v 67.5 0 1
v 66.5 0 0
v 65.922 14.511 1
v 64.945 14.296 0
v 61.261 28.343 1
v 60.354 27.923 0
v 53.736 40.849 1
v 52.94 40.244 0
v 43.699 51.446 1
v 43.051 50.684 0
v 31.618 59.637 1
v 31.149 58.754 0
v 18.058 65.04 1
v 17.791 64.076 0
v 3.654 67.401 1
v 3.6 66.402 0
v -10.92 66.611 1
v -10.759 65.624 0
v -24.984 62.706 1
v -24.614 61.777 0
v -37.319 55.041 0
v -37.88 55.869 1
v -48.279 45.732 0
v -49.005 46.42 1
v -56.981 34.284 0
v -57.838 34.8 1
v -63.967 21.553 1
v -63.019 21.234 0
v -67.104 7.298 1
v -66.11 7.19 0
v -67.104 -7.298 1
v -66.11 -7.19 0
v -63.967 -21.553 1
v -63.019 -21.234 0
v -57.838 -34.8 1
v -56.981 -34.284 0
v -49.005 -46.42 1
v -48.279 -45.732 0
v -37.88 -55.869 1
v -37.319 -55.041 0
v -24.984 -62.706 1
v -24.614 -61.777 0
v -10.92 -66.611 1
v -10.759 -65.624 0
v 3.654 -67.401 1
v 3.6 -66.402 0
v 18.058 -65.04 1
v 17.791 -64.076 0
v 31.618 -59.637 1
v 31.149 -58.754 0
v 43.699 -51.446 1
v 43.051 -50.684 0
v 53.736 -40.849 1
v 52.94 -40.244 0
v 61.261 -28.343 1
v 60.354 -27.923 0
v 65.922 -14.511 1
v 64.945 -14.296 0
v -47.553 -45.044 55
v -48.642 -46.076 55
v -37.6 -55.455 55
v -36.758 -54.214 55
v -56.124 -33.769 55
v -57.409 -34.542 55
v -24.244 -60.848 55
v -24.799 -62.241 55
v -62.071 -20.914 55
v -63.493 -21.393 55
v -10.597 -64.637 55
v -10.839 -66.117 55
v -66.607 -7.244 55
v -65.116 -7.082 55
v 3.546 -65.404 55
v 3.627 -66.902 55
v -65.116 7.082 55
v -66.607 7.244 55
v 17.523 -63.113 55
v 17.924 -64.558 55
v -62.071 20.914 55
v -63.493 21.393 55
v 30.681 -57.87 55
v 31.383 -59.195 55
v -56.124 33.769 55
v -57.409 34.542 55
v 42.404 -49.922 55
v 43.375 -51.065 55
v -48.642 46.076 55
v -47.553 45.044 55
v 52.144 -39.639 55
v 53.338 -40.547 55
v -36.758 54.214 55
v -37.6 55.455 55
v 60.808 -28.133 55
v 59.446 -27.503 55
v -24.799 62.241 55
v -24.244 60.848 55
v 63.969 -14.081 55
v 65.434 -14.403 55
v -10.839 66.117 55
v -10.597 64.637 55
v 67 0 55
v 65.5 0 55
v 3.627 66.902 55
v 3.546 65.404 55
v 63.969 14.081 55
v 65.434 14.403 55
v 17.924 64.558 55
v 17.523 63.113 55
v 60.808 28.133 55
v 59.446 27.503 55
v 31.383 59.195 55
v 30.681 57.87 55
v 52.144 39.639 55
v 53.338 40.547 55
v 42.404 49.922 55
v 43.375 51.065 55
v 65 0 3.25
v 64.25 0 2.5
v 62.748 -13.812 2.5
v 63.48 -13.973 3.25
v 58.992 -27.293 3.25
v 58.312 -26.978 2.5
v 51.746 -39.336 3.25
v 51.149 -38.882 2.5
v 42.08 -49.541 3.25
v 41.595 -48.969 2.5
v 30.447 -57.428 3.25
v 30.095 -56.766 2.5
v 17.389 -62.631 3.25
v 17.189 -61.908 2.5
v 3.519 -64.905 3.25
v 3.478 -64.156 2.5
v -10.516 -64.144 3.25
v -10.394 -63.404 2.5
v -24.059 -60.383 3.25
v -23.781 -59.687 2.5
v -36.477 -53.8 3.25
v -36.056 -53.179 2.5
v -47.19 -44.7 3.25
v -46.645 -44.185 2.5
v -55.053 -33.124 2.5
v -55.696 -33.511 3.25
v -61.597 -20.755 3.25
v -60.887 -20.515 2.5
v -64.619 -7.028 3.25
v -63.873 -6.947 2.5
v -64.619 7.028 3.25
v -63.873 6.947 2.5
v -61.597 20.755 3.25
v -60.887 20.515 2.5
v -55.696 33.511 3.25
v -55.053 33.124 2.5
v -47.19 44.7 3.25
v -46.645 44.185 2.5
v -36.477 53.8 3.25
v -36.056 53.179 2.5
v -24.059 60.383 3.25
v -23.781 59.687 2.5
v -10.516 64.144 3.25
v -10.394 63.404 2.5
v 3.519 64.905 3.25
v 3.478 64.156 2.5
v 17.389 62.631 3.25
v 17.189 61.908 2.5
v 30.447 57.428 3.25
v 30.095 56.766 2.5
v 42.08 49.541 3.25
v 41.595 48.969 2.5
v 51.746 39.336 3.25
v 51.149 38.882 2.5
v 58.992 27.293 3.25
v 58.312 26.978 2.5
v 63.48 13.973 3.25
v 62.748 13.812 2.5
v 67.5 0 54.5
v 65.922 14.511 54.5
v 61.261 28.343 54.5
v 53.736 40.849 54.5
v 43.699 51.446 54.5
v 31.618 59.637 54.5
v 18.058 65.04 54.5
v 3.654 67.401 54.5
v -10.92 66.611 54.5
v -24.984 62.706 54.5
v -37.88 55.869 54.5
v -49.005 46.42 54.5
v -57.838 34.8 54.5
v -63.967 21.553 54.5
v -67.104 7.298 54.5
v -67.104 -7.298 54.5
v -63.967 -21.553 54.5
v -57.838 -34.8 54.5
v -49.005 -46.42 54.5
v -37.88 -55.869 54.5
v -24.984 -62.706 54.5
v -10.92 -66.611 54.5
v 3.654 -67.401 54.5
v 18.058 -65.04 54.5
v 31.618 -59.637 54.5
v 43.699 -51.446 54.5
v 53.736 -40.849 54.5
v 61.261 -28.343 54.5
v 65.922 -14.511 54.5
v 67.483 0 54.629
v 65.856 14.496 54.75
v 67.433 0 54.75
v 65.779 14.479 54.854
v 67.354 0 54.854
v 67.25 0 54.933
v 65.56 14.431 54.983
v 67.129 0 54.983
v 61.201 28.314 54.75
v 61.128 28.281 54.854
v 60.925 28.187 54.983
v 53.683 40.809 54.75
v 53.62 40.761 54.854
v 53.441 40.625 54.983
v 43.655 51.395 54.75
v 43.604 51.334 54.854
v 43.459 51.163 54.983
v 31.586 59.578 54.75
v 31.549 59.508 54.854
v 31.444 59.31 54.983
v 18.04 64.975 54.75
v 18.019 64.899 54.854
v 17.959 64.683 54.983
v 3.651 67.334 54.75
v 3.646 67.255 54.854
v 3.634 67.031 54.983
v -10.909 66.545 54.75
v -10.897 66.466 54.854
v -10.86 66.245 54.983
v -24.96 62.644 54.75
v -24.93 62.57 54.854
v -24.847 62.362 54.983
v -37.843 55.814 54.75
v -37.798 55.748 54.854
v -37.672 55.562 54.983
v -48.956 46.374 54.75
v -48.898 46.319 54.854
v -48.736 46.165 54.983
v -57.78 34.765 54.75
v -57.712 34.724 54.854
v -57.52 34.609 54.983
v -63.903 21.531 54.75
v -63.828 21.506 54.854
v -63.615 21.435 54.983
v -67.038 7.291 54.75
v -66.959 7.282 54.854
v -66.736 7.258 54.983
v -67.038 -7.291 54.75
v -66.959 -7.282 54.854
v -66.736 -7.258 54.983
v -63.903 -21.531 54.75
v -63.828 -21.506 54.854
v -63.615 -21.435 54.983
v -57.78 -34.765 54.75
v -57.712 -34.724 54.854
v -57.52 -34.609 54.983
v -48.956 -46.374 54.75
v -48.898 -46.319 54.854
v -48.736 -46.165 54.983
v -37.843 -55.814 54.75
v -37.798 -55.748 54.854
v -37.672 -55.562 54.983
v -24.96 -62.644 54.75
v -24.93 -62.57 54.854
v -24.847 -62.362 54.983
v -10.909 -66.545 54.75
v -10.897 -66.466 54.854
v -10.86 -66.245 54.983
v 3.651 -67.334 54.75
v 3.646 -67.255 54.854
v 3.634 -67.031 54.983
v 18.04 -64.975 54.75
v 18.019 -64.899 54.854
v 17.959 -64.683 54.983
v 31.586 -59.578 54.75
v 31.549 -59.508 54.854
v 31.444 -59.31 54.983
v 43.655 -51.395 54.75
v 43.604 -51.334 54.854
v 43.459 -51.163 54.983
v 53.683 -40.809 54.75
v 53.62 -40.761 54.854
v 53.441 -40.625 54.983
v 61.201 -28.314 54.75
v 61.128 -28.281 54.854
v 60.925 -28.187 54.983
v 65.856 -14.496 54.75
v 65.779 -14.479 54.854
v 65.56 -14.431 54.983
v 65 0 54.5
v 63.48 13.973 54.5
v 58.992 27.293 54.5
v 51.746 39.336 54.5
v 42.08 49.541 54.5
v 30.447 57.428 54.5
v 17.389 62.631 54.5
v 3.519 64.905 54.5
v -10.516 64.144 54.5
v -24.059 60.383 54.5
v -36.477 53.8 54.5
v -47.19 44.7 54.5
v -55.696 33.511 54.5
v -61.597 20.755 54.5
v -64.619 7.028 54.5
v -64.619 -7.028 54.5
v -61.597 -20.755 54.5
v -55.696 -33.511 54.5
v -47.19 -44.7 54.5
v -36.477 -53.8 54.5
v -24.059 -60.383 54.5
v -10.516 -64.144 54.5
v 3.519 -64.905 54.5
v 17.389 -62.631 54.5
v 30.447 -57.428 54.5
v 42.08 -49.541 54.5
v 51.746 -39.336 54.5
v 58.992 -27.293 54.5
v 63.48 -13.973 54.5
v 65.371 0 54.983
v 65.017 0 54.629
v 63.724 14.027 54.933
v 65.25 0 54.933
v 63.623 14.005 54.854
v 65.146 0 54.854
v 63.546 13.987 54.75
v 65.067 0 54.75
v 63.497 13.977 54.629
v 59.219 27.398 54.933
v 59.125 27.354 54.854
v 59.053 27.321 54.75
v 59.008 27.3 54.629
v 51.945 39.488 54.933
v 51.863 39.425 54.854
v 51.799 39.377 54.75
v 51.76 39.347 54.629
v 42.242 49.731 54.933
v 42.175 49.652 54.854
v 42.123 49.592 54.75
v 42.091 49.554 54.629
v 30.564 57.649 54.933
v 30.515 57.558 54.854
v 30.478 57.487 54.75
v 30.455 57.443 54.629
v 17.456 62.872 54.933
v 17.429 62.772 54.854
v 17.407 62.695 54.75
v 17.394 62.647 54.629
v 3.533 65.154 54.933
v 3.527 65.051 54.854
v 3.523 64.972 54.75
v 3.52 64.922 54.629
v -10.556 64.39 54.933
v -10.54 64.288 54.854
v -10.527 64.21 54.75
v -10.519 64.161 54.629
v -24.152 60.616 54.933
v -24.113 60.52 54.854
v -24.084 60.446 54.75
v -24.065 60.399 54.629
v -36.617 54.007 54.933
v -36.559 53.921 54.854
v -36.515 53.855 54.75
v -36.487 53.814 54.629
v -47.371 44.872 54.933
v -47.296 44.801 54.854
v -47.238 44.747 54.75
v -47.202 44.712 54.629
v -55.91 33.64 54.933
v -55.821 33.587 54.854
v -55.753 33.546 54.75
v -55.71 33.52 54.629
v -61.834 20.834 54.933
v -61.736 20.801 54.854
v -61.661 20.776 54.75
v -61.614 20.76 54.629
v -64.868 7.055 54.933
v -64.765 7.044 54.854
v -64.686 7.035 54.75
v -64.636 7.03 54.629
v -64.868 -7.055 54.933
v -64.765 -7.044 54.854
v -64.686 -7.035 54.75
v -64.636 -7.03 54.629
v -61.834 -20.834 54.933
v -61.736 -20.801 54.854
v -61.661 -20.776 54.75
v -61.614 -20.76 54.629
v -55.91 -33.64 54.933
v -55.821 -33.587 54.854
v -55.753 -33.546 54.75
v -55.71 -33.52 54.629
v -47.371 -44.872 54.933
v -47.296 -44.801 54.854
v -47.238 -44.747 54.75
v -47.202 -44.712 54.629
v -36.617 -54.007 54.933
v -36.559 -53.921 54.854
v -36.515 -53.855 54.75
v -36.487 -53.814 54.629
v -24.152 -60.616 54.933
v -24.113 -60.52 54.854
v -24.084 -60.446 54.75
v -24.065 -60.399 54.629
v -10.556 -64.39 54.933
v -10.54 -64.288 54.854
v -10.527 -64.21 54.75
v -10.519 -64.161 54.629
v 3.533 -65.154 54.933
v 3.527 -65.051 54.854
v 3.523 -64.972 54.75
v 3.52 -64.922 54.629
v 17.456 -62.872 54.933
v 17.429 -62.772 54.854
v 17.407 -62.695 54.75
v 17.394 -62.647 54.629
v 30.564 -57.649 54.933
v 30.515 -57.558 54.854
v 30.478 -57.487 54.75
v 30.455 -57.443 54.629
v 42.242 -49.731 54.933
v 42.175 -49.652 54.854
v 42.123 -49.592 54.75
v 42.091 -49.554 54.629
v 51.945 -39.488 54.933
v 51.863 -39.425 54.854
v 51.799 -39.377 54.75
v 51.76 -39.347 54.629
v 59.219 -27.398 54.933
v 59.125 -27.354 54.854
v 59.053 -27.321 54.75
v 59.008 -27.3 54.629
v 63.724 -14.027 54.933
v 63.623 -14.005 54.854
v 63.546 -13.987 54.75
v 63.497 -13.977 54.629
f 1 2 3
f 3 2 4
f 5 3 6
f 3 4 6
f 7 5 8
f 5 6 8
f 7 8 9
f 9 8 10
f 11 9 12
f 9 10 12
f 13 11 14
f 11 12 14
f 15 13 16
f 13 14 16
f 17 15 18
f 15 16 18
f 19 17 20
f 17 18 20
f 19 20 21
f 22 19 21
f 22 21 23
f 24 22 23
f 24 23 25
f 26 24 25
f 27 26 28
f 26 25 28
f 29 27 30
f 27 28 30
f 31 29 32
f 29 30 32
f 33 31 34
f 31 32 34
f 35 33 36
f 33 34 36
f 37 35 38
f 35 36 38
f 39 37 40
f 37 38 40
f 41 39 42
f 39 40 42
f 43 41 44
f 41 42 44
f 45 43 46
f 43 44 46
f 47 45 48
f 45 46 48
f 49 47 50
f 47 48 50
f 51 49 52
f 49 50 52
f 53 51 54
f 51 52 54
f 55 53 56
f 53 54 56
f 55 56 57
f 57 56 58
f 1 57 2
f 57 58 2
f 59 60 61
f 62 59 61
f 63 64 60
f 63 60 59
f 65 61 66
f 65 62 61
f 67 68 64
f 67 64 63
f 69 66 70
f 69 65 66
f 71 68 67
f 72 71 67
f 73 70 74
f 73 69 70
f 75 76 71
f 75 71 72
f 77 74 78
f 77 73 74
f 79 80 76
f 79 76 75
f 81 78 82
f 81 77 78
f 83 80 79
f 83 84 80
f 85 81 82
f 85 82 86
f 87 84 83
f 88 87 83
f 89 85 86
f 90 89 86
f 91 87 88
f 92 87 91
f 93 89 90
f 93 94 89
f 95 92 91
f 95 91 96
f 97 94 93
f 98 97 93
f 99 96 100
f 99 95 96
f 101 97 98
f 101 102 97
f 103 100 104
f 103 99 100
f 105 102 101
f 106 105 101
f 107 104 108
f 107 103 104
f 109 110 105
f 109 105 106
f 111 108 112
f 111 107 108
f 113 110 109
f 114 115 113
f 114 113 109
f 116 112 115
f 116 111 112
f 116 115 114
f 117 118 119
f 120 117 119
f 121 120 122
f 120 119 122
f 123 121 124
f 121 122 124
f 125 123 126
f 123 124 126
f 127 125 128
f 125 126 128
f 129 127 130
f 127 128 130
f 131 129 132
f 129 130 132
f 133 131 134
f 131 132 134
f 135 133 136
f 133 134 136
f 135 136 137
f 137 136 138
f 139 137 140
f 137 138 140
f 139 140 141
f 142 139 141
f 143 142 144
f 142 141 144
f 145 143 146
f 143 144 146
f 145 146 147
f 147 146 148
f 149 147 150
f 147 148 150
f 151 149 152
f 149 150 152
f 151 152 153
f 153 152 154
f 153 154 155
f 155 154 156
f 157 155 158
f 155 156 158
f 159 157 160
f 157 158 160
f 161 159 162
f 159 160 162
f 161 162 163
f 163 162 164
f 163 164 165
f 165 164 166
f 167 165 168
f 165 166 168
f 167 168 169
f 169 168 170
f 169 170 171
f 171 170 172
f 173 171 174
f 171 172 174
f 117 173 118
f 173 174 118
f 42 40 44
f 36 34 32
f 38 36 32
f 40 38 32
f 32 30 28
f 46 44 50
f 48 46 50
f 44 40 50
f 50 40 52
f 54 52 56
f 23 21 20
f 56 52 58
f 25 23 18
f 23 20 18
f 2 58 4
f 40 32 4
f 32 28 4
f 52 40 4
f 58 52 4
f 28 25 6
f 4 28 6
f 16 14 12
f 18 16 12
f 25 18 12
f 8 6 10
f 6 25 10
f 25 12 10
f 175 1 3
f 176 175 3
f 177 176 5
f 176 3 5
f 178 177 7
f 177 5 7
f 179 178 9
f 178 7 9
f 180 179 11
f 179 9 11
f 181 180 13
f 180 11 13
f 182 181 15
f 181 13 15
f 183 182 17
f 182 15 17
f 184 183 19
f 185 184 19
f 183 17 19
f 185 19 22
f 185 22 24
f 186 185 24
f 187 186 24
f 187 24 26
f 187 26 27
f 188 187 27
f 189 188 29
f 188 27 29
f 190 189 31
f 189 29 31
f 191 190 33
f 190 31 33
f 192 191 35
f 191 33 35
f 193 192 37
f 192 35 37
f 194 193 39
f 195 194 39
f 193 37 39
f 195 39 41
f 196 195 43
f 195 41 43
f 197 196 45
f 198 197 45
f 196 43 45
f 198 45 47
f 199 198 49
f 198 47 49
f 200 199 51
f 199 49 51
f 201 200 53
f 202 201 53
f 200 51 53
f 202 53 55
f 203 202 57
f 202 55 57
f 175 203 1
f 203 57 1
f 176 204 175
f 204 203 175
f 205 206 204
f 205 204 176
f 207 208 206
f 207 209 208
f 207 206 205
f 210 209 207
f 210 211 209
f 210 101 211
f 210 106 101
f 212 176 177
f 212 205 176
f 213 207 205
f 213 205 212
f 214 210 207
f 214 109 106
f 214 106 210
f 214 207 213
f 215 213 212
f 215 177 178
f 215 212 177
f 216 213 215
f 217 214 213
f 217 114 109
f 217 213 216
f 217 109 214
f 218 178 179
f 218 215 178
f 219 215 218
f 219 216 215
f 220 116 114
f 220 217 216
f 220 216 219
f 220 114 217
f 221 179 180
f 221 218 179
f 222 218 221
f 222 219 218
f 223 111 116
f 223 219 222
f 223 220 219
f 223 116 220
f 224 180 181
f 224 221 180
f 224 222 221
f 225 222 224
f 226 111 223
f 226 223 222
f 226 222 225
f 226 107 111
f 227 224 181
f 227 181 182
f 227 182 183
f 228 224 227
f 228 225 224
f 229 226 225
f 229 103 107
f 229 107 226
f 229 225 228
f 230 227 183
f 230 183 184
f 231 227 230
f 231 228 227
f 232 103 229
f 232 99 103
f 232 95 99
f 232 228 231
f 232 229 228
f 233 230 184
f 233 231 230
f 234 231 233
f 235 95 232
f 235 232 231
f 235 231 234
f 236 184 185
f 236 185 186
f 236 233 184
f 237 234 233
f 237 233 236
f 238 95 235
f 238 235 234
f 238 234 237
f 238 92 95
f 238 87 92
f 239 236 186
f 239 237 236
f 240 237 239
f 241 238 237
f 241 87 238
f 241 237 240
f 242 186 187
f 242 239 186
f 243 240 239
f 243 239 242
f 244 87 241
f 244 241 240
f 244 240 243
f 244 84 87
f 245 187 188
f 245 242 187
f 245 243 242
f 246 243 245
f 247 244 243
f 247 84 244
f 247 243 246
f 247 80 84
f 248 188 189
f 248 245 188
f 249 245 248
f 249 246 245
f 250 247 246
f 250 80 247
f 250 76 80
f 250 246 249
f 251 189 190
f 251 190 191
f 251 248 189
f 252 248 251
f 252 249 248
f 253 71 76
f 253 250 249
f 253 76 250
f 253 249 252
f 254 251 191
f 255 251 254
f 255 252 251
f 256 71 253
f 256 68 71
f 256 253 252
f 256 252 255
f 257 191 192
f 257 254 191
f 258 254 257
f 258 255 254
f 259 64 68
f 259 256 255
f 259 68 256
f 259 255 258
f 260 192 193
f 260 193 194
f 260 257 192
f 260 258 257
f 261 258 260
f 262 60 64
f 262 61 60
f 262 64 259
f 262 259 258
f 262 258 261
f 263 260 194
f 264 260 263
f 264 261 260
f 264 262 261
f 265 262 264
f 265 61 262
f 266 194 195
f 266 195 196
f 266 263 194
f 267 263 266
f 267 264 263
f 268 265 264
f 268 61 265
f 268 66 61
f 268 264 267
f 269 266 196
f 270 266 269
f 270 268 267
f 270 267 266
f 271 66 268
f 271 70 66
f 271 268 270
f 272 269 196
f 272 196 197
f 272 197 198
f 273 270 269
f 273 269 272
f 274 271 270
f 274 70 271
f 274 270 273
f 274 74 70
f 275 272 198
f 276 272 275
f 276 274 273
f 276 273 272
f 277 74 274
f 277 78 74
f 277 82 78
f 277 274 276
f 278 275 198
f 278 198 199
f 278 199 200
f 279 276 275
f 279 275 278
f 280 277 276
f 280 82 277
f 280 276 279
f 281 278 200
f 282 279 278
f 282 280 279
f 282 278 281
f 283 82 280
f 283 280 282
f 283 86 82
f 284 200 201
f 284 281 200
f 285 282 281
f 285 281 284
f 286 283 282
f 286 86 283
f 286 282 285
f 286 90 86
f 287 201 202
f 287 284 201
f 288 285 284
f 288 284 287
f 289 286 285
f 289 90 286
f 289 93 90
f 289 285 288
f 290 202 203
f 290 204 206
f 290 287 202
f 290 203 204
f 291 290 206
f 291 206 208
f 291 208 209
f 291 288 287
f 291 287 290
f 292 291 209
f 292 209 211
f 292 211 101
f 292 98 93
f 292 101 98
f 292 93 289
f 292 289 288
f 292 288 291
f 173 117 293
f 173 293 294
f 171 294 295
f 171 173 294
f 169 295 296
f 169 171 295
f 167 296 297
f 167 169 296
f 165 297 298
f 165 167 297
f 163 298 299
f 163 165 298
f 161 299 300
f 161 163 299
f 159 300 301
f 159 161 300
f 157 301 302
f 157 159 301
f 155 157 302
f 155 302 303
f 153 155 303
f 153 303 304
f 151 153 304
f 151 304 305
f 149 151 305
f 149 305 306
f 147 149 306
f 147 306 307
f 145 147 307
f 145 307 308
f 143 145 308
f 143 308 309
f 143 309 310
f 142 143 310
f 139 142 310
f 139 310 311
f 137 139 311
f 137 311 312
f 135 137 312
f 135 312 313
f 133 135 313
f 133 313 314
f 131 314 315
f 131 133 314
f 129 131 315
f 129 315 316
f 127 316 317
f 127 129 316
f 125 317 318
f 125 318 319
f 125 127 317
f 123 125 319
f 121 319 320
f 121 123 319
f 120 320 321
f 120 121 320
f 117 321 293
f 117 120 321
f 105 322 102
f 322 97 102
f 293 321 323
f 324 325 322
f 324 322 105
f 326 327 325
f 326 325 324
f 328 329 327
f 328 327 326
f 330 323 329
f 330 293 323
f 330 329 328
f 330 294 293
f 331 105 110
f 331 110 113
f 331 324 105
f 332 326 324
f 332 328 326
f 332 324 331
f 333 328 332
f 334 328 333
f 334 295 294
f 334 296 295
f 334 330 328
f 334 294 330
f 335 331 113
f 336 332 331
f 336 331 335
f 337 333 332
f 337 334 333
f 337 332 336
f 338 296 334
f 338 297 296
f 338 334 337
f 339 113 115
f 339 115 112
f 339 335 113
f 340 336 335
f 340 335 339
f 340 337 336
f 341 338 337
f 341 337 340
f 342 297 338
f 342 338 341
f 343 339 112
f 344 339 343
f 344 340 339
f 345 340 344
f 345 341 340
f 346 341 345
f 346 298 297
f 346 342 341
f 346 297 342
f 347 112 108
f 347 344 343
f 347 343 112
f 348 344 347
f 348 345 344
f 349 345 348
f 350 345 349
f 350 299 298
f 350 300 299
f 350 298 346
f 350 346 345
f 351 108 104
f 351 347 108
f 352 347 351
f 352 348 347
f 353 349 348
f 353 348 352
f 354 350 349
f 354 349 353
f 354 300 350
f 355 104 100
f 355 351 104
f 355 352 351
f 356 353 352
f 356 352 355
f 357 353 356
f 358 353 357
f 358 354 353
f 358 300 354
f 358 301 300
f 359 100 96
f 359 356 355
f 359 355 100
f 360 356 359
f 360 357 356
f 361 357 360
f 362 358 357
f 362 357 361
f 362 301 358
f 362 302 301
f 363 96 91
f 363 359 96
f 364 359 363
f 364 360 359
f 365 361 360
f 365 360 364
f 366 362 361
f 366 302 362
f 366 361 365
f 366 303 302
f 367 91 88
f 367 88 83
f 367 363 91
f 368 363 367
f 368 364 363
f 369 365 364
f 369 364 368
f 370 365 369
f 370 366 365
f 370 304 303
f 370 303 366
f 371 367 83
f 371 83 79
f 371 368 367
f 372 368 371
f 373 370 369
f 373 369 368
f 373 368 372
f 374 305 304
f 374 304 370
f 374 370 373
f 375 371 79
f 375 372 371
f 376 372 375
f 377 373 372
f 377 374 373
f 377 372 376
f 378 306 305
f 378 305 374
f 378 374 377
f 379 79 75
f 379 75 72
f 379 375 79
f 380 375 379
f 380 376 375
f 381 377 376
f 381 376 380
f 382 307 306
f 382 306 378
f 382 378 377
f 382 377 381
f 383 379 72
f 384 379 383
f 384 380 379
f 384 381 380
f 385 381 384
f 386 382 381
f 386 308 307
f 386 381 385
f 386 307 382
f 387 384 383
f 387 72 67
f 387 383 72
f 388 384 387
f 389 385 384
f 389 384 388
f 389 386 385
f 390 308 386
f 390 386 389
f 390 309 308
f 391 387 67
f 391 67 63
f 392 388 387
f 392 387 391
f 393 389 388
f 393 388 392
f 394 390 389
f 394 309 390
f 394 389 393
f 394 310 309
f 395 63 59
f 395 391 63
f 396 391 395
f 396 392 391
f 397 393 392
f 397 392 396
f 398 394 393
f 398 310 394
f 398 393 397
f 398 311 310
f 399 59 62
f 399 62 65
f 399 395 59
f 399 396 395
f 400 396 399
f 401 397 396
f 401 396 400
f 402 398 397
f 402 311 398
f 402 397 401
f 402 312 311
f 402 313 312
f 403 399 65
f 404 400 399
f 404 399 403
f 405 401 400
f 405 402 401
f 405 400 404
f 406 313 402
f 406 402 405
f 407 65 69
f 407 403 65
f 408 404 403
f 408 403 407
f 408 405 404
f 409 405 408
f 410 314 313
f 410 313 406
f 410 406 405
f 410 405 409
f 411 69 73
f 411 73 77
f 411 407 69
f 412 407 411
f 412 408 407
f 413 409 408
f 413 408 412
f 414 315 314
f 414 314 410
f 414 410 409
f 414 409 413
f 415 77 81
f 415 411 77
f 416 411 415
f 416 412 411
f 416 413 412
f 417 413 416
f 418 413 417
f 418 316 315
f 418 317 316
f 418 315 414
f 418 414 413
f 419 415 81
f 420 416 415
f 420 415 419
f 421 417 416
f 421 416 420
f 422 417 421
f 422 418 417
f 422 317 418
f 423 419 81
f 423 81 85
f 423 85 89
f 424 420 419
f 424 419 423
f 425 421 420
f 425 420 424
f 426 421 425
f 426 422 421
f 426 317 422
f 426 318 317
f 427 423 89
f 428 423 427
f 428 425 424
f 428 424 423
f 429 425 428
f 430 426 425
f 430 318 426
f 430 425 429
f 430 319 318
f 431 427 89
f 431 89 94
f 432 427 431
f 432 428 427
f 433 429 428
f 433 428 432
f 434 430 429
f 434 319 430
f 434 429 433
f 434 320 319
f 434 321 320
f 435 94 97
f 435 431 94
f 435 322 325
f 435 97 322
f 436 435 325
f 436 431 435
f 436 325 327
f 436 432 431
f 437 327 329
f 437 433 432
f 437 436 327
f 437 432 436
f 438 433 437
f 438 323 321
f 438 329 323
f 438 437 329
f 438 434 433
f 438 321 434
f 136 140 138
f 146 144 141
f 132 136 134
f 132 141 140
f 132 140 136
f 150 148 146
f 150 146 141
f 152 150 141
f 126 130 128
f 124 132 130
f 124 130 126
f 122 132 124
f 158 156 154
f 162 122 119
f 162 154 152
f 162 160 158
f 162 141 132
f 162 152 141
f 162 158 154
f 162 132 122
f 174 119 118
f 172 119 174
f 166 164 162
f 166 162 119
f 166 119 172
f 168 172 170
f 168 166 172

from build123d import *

# Parameters (mm, degrees)
F0_R     = 67.5
F1_DEPTH = 55
F2_T     = -2.5
F3_R     = 0.5
F4_SIZE  = 1
F5_SIZE  = 0.75


with BuildPart() as f1:
    # F0 (on Top) → F1 (new body)
    with BuildSketch(Plane.XY):
        Circle(F0_R)
    extrude(amount=F1_DEPTH)

    # F2
    f2_openings = [f1.faces().sort_by_distance(p)[0] for p in [
        (0, 0, 55),
    ]]
    offset(amount=F2_T, openings=f2_openings)

    # F3
    f3_edges = [f1.edges().sort_by_distance(p)[0] for p in [
        (-67.5, 0, 55),
        (-65, 0, 55),
    ]]
    fillet(f3_edges, radius=F3_R)

    # F4
    f4_edges = [f1.edges().sort_by_distance(p)[0] for p in [
        (-67.5, 0, 0),
    ]]
    chamfer(f4_edges, length=F4_SIZE)

    # F5
    f5_edges = [f1.edges().sort_by_distance(p)[0] for p in [
        (-65, 0, 2.5),
    ]]
    chamfer(f5_edges, length=F5_SIZE)


solid = f1.part
